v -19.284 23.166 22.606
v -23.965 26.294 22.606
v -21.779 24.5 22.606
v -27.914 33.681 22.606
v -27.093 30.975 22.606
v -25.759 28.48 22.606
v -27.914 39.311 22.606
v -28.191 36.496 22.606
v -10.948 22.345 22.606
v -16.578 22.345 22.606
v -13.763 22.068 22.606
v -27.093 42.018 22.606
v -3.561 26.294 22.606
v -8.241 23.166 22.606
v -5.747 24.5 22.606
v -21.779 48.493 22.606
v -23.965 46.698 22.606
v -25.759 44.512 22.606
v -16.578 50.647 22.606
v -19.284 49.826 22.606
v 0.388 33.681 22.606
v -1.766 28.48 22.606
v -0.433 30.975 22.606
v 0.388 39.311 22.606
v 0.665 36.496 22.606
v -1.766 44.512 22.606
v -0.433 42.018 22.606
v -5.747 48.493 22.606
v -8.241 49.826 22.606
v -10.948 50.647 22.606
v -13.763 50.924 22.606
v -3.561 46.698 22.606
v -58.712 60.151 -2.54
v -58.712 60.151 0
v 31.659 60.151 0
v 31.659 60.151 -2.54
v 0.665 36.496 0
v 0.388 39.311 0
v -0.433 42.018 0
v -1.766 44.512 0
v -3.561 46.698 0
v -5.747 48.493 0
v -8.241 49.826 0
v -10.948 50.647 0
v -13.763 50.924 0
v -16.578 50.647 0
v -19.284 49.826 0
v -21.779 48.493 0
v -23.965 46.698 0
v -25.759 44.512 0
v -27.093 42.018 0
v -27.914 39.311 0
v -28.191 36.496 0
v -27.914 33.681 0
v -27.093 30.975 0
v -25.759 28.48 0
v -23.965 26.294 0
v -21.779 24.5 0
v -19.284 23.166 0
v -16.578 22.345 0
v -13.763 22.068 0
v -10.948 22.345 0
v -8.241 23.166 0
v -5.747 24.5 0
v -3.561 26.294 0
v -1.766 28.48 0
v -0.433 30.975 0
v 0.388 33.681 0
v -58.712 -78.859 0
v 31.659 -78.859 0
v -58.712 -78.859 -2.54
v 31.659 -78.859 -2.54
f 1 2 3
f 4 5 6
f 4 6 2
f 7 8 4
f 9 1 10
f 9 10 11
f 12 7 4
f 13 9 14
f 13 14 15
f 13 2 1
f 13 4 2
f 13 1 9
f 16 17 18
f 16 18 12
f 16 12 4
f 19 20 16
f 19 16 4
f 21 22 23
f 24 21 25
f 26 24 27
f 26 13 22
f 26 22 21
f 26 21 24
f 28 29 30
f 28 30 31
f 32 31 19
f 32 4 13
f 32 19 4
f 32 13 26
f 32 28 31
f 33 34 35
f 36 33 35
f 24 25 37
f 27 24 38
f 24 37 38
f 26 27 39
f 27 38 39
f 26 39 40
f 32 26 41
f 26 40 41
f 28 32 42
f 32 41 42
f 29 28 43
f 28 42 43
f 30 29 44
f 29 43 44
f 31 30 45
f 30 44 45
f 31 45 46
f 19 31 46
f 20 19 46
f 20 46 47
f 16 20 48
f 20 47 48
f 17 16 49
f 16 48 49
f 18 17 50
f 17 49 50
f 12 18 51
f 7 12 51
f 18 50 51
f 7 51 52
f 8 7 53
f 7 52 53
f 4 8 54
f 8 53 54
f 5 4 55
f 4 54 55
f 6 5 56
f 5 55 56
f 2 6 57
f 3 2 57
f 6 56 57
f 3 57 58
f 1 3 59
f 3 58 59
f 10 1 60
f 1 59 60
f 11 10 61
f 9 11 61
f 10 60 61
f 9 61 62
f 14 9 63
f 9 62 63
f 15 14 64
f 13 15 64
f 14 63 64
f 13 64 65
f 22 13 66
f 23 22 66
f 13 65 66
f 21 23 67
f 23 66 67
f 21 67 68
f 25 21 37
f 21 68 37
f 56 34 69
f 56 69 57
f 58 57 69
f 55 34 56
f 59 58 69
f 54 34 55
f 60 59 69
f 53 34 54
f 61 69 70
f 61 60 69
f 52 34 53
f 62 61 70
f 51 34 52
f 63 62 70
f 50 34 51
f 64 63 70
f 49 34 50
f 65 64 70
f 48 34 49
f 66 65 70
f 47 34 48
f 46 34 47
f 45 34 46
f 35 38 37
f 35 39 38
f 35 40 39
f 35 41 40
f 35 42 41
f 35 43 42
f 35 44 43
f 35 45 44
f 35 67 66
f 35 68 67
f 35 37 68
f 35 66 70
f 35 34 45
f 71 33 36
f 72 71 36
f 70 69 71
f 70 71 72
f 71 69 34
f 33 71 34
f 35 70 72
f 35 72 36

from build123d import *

# Parameters (mm, degrees)
F0_W     = 90.371005
F0_H     = 139.010184
F1_DEPTH = 2.54
F2_T     = -2.54
F3_R     = 14.428141
F4_DEPTH = 22.606


with BuildPart() as f1:
    # F0 (on Top) → F1 (new body)
    with BuildSketch(Plane.XY):
        with Locations((-13.526871, -9.353686)):
            Rectangle(F0_W, F0_H)
    extrude(amount=-F1_DEPTH)

    # F2
    f2_openings = [f1.faces().sort_by_distance(p)[0] for p in [
        (-13.526872, -9.353686, 0),
    ]]
    offset(amount=F2_T, openings=f2_openings)

    # F3 (on face) → F4 (join)
    with BuildSketch(Plane.XY):
        with Locations((-13.762863, 36.496103)):
            Circle(F3_R)
    extrude(amount=F4_DEPTH)


solid = f1.part
